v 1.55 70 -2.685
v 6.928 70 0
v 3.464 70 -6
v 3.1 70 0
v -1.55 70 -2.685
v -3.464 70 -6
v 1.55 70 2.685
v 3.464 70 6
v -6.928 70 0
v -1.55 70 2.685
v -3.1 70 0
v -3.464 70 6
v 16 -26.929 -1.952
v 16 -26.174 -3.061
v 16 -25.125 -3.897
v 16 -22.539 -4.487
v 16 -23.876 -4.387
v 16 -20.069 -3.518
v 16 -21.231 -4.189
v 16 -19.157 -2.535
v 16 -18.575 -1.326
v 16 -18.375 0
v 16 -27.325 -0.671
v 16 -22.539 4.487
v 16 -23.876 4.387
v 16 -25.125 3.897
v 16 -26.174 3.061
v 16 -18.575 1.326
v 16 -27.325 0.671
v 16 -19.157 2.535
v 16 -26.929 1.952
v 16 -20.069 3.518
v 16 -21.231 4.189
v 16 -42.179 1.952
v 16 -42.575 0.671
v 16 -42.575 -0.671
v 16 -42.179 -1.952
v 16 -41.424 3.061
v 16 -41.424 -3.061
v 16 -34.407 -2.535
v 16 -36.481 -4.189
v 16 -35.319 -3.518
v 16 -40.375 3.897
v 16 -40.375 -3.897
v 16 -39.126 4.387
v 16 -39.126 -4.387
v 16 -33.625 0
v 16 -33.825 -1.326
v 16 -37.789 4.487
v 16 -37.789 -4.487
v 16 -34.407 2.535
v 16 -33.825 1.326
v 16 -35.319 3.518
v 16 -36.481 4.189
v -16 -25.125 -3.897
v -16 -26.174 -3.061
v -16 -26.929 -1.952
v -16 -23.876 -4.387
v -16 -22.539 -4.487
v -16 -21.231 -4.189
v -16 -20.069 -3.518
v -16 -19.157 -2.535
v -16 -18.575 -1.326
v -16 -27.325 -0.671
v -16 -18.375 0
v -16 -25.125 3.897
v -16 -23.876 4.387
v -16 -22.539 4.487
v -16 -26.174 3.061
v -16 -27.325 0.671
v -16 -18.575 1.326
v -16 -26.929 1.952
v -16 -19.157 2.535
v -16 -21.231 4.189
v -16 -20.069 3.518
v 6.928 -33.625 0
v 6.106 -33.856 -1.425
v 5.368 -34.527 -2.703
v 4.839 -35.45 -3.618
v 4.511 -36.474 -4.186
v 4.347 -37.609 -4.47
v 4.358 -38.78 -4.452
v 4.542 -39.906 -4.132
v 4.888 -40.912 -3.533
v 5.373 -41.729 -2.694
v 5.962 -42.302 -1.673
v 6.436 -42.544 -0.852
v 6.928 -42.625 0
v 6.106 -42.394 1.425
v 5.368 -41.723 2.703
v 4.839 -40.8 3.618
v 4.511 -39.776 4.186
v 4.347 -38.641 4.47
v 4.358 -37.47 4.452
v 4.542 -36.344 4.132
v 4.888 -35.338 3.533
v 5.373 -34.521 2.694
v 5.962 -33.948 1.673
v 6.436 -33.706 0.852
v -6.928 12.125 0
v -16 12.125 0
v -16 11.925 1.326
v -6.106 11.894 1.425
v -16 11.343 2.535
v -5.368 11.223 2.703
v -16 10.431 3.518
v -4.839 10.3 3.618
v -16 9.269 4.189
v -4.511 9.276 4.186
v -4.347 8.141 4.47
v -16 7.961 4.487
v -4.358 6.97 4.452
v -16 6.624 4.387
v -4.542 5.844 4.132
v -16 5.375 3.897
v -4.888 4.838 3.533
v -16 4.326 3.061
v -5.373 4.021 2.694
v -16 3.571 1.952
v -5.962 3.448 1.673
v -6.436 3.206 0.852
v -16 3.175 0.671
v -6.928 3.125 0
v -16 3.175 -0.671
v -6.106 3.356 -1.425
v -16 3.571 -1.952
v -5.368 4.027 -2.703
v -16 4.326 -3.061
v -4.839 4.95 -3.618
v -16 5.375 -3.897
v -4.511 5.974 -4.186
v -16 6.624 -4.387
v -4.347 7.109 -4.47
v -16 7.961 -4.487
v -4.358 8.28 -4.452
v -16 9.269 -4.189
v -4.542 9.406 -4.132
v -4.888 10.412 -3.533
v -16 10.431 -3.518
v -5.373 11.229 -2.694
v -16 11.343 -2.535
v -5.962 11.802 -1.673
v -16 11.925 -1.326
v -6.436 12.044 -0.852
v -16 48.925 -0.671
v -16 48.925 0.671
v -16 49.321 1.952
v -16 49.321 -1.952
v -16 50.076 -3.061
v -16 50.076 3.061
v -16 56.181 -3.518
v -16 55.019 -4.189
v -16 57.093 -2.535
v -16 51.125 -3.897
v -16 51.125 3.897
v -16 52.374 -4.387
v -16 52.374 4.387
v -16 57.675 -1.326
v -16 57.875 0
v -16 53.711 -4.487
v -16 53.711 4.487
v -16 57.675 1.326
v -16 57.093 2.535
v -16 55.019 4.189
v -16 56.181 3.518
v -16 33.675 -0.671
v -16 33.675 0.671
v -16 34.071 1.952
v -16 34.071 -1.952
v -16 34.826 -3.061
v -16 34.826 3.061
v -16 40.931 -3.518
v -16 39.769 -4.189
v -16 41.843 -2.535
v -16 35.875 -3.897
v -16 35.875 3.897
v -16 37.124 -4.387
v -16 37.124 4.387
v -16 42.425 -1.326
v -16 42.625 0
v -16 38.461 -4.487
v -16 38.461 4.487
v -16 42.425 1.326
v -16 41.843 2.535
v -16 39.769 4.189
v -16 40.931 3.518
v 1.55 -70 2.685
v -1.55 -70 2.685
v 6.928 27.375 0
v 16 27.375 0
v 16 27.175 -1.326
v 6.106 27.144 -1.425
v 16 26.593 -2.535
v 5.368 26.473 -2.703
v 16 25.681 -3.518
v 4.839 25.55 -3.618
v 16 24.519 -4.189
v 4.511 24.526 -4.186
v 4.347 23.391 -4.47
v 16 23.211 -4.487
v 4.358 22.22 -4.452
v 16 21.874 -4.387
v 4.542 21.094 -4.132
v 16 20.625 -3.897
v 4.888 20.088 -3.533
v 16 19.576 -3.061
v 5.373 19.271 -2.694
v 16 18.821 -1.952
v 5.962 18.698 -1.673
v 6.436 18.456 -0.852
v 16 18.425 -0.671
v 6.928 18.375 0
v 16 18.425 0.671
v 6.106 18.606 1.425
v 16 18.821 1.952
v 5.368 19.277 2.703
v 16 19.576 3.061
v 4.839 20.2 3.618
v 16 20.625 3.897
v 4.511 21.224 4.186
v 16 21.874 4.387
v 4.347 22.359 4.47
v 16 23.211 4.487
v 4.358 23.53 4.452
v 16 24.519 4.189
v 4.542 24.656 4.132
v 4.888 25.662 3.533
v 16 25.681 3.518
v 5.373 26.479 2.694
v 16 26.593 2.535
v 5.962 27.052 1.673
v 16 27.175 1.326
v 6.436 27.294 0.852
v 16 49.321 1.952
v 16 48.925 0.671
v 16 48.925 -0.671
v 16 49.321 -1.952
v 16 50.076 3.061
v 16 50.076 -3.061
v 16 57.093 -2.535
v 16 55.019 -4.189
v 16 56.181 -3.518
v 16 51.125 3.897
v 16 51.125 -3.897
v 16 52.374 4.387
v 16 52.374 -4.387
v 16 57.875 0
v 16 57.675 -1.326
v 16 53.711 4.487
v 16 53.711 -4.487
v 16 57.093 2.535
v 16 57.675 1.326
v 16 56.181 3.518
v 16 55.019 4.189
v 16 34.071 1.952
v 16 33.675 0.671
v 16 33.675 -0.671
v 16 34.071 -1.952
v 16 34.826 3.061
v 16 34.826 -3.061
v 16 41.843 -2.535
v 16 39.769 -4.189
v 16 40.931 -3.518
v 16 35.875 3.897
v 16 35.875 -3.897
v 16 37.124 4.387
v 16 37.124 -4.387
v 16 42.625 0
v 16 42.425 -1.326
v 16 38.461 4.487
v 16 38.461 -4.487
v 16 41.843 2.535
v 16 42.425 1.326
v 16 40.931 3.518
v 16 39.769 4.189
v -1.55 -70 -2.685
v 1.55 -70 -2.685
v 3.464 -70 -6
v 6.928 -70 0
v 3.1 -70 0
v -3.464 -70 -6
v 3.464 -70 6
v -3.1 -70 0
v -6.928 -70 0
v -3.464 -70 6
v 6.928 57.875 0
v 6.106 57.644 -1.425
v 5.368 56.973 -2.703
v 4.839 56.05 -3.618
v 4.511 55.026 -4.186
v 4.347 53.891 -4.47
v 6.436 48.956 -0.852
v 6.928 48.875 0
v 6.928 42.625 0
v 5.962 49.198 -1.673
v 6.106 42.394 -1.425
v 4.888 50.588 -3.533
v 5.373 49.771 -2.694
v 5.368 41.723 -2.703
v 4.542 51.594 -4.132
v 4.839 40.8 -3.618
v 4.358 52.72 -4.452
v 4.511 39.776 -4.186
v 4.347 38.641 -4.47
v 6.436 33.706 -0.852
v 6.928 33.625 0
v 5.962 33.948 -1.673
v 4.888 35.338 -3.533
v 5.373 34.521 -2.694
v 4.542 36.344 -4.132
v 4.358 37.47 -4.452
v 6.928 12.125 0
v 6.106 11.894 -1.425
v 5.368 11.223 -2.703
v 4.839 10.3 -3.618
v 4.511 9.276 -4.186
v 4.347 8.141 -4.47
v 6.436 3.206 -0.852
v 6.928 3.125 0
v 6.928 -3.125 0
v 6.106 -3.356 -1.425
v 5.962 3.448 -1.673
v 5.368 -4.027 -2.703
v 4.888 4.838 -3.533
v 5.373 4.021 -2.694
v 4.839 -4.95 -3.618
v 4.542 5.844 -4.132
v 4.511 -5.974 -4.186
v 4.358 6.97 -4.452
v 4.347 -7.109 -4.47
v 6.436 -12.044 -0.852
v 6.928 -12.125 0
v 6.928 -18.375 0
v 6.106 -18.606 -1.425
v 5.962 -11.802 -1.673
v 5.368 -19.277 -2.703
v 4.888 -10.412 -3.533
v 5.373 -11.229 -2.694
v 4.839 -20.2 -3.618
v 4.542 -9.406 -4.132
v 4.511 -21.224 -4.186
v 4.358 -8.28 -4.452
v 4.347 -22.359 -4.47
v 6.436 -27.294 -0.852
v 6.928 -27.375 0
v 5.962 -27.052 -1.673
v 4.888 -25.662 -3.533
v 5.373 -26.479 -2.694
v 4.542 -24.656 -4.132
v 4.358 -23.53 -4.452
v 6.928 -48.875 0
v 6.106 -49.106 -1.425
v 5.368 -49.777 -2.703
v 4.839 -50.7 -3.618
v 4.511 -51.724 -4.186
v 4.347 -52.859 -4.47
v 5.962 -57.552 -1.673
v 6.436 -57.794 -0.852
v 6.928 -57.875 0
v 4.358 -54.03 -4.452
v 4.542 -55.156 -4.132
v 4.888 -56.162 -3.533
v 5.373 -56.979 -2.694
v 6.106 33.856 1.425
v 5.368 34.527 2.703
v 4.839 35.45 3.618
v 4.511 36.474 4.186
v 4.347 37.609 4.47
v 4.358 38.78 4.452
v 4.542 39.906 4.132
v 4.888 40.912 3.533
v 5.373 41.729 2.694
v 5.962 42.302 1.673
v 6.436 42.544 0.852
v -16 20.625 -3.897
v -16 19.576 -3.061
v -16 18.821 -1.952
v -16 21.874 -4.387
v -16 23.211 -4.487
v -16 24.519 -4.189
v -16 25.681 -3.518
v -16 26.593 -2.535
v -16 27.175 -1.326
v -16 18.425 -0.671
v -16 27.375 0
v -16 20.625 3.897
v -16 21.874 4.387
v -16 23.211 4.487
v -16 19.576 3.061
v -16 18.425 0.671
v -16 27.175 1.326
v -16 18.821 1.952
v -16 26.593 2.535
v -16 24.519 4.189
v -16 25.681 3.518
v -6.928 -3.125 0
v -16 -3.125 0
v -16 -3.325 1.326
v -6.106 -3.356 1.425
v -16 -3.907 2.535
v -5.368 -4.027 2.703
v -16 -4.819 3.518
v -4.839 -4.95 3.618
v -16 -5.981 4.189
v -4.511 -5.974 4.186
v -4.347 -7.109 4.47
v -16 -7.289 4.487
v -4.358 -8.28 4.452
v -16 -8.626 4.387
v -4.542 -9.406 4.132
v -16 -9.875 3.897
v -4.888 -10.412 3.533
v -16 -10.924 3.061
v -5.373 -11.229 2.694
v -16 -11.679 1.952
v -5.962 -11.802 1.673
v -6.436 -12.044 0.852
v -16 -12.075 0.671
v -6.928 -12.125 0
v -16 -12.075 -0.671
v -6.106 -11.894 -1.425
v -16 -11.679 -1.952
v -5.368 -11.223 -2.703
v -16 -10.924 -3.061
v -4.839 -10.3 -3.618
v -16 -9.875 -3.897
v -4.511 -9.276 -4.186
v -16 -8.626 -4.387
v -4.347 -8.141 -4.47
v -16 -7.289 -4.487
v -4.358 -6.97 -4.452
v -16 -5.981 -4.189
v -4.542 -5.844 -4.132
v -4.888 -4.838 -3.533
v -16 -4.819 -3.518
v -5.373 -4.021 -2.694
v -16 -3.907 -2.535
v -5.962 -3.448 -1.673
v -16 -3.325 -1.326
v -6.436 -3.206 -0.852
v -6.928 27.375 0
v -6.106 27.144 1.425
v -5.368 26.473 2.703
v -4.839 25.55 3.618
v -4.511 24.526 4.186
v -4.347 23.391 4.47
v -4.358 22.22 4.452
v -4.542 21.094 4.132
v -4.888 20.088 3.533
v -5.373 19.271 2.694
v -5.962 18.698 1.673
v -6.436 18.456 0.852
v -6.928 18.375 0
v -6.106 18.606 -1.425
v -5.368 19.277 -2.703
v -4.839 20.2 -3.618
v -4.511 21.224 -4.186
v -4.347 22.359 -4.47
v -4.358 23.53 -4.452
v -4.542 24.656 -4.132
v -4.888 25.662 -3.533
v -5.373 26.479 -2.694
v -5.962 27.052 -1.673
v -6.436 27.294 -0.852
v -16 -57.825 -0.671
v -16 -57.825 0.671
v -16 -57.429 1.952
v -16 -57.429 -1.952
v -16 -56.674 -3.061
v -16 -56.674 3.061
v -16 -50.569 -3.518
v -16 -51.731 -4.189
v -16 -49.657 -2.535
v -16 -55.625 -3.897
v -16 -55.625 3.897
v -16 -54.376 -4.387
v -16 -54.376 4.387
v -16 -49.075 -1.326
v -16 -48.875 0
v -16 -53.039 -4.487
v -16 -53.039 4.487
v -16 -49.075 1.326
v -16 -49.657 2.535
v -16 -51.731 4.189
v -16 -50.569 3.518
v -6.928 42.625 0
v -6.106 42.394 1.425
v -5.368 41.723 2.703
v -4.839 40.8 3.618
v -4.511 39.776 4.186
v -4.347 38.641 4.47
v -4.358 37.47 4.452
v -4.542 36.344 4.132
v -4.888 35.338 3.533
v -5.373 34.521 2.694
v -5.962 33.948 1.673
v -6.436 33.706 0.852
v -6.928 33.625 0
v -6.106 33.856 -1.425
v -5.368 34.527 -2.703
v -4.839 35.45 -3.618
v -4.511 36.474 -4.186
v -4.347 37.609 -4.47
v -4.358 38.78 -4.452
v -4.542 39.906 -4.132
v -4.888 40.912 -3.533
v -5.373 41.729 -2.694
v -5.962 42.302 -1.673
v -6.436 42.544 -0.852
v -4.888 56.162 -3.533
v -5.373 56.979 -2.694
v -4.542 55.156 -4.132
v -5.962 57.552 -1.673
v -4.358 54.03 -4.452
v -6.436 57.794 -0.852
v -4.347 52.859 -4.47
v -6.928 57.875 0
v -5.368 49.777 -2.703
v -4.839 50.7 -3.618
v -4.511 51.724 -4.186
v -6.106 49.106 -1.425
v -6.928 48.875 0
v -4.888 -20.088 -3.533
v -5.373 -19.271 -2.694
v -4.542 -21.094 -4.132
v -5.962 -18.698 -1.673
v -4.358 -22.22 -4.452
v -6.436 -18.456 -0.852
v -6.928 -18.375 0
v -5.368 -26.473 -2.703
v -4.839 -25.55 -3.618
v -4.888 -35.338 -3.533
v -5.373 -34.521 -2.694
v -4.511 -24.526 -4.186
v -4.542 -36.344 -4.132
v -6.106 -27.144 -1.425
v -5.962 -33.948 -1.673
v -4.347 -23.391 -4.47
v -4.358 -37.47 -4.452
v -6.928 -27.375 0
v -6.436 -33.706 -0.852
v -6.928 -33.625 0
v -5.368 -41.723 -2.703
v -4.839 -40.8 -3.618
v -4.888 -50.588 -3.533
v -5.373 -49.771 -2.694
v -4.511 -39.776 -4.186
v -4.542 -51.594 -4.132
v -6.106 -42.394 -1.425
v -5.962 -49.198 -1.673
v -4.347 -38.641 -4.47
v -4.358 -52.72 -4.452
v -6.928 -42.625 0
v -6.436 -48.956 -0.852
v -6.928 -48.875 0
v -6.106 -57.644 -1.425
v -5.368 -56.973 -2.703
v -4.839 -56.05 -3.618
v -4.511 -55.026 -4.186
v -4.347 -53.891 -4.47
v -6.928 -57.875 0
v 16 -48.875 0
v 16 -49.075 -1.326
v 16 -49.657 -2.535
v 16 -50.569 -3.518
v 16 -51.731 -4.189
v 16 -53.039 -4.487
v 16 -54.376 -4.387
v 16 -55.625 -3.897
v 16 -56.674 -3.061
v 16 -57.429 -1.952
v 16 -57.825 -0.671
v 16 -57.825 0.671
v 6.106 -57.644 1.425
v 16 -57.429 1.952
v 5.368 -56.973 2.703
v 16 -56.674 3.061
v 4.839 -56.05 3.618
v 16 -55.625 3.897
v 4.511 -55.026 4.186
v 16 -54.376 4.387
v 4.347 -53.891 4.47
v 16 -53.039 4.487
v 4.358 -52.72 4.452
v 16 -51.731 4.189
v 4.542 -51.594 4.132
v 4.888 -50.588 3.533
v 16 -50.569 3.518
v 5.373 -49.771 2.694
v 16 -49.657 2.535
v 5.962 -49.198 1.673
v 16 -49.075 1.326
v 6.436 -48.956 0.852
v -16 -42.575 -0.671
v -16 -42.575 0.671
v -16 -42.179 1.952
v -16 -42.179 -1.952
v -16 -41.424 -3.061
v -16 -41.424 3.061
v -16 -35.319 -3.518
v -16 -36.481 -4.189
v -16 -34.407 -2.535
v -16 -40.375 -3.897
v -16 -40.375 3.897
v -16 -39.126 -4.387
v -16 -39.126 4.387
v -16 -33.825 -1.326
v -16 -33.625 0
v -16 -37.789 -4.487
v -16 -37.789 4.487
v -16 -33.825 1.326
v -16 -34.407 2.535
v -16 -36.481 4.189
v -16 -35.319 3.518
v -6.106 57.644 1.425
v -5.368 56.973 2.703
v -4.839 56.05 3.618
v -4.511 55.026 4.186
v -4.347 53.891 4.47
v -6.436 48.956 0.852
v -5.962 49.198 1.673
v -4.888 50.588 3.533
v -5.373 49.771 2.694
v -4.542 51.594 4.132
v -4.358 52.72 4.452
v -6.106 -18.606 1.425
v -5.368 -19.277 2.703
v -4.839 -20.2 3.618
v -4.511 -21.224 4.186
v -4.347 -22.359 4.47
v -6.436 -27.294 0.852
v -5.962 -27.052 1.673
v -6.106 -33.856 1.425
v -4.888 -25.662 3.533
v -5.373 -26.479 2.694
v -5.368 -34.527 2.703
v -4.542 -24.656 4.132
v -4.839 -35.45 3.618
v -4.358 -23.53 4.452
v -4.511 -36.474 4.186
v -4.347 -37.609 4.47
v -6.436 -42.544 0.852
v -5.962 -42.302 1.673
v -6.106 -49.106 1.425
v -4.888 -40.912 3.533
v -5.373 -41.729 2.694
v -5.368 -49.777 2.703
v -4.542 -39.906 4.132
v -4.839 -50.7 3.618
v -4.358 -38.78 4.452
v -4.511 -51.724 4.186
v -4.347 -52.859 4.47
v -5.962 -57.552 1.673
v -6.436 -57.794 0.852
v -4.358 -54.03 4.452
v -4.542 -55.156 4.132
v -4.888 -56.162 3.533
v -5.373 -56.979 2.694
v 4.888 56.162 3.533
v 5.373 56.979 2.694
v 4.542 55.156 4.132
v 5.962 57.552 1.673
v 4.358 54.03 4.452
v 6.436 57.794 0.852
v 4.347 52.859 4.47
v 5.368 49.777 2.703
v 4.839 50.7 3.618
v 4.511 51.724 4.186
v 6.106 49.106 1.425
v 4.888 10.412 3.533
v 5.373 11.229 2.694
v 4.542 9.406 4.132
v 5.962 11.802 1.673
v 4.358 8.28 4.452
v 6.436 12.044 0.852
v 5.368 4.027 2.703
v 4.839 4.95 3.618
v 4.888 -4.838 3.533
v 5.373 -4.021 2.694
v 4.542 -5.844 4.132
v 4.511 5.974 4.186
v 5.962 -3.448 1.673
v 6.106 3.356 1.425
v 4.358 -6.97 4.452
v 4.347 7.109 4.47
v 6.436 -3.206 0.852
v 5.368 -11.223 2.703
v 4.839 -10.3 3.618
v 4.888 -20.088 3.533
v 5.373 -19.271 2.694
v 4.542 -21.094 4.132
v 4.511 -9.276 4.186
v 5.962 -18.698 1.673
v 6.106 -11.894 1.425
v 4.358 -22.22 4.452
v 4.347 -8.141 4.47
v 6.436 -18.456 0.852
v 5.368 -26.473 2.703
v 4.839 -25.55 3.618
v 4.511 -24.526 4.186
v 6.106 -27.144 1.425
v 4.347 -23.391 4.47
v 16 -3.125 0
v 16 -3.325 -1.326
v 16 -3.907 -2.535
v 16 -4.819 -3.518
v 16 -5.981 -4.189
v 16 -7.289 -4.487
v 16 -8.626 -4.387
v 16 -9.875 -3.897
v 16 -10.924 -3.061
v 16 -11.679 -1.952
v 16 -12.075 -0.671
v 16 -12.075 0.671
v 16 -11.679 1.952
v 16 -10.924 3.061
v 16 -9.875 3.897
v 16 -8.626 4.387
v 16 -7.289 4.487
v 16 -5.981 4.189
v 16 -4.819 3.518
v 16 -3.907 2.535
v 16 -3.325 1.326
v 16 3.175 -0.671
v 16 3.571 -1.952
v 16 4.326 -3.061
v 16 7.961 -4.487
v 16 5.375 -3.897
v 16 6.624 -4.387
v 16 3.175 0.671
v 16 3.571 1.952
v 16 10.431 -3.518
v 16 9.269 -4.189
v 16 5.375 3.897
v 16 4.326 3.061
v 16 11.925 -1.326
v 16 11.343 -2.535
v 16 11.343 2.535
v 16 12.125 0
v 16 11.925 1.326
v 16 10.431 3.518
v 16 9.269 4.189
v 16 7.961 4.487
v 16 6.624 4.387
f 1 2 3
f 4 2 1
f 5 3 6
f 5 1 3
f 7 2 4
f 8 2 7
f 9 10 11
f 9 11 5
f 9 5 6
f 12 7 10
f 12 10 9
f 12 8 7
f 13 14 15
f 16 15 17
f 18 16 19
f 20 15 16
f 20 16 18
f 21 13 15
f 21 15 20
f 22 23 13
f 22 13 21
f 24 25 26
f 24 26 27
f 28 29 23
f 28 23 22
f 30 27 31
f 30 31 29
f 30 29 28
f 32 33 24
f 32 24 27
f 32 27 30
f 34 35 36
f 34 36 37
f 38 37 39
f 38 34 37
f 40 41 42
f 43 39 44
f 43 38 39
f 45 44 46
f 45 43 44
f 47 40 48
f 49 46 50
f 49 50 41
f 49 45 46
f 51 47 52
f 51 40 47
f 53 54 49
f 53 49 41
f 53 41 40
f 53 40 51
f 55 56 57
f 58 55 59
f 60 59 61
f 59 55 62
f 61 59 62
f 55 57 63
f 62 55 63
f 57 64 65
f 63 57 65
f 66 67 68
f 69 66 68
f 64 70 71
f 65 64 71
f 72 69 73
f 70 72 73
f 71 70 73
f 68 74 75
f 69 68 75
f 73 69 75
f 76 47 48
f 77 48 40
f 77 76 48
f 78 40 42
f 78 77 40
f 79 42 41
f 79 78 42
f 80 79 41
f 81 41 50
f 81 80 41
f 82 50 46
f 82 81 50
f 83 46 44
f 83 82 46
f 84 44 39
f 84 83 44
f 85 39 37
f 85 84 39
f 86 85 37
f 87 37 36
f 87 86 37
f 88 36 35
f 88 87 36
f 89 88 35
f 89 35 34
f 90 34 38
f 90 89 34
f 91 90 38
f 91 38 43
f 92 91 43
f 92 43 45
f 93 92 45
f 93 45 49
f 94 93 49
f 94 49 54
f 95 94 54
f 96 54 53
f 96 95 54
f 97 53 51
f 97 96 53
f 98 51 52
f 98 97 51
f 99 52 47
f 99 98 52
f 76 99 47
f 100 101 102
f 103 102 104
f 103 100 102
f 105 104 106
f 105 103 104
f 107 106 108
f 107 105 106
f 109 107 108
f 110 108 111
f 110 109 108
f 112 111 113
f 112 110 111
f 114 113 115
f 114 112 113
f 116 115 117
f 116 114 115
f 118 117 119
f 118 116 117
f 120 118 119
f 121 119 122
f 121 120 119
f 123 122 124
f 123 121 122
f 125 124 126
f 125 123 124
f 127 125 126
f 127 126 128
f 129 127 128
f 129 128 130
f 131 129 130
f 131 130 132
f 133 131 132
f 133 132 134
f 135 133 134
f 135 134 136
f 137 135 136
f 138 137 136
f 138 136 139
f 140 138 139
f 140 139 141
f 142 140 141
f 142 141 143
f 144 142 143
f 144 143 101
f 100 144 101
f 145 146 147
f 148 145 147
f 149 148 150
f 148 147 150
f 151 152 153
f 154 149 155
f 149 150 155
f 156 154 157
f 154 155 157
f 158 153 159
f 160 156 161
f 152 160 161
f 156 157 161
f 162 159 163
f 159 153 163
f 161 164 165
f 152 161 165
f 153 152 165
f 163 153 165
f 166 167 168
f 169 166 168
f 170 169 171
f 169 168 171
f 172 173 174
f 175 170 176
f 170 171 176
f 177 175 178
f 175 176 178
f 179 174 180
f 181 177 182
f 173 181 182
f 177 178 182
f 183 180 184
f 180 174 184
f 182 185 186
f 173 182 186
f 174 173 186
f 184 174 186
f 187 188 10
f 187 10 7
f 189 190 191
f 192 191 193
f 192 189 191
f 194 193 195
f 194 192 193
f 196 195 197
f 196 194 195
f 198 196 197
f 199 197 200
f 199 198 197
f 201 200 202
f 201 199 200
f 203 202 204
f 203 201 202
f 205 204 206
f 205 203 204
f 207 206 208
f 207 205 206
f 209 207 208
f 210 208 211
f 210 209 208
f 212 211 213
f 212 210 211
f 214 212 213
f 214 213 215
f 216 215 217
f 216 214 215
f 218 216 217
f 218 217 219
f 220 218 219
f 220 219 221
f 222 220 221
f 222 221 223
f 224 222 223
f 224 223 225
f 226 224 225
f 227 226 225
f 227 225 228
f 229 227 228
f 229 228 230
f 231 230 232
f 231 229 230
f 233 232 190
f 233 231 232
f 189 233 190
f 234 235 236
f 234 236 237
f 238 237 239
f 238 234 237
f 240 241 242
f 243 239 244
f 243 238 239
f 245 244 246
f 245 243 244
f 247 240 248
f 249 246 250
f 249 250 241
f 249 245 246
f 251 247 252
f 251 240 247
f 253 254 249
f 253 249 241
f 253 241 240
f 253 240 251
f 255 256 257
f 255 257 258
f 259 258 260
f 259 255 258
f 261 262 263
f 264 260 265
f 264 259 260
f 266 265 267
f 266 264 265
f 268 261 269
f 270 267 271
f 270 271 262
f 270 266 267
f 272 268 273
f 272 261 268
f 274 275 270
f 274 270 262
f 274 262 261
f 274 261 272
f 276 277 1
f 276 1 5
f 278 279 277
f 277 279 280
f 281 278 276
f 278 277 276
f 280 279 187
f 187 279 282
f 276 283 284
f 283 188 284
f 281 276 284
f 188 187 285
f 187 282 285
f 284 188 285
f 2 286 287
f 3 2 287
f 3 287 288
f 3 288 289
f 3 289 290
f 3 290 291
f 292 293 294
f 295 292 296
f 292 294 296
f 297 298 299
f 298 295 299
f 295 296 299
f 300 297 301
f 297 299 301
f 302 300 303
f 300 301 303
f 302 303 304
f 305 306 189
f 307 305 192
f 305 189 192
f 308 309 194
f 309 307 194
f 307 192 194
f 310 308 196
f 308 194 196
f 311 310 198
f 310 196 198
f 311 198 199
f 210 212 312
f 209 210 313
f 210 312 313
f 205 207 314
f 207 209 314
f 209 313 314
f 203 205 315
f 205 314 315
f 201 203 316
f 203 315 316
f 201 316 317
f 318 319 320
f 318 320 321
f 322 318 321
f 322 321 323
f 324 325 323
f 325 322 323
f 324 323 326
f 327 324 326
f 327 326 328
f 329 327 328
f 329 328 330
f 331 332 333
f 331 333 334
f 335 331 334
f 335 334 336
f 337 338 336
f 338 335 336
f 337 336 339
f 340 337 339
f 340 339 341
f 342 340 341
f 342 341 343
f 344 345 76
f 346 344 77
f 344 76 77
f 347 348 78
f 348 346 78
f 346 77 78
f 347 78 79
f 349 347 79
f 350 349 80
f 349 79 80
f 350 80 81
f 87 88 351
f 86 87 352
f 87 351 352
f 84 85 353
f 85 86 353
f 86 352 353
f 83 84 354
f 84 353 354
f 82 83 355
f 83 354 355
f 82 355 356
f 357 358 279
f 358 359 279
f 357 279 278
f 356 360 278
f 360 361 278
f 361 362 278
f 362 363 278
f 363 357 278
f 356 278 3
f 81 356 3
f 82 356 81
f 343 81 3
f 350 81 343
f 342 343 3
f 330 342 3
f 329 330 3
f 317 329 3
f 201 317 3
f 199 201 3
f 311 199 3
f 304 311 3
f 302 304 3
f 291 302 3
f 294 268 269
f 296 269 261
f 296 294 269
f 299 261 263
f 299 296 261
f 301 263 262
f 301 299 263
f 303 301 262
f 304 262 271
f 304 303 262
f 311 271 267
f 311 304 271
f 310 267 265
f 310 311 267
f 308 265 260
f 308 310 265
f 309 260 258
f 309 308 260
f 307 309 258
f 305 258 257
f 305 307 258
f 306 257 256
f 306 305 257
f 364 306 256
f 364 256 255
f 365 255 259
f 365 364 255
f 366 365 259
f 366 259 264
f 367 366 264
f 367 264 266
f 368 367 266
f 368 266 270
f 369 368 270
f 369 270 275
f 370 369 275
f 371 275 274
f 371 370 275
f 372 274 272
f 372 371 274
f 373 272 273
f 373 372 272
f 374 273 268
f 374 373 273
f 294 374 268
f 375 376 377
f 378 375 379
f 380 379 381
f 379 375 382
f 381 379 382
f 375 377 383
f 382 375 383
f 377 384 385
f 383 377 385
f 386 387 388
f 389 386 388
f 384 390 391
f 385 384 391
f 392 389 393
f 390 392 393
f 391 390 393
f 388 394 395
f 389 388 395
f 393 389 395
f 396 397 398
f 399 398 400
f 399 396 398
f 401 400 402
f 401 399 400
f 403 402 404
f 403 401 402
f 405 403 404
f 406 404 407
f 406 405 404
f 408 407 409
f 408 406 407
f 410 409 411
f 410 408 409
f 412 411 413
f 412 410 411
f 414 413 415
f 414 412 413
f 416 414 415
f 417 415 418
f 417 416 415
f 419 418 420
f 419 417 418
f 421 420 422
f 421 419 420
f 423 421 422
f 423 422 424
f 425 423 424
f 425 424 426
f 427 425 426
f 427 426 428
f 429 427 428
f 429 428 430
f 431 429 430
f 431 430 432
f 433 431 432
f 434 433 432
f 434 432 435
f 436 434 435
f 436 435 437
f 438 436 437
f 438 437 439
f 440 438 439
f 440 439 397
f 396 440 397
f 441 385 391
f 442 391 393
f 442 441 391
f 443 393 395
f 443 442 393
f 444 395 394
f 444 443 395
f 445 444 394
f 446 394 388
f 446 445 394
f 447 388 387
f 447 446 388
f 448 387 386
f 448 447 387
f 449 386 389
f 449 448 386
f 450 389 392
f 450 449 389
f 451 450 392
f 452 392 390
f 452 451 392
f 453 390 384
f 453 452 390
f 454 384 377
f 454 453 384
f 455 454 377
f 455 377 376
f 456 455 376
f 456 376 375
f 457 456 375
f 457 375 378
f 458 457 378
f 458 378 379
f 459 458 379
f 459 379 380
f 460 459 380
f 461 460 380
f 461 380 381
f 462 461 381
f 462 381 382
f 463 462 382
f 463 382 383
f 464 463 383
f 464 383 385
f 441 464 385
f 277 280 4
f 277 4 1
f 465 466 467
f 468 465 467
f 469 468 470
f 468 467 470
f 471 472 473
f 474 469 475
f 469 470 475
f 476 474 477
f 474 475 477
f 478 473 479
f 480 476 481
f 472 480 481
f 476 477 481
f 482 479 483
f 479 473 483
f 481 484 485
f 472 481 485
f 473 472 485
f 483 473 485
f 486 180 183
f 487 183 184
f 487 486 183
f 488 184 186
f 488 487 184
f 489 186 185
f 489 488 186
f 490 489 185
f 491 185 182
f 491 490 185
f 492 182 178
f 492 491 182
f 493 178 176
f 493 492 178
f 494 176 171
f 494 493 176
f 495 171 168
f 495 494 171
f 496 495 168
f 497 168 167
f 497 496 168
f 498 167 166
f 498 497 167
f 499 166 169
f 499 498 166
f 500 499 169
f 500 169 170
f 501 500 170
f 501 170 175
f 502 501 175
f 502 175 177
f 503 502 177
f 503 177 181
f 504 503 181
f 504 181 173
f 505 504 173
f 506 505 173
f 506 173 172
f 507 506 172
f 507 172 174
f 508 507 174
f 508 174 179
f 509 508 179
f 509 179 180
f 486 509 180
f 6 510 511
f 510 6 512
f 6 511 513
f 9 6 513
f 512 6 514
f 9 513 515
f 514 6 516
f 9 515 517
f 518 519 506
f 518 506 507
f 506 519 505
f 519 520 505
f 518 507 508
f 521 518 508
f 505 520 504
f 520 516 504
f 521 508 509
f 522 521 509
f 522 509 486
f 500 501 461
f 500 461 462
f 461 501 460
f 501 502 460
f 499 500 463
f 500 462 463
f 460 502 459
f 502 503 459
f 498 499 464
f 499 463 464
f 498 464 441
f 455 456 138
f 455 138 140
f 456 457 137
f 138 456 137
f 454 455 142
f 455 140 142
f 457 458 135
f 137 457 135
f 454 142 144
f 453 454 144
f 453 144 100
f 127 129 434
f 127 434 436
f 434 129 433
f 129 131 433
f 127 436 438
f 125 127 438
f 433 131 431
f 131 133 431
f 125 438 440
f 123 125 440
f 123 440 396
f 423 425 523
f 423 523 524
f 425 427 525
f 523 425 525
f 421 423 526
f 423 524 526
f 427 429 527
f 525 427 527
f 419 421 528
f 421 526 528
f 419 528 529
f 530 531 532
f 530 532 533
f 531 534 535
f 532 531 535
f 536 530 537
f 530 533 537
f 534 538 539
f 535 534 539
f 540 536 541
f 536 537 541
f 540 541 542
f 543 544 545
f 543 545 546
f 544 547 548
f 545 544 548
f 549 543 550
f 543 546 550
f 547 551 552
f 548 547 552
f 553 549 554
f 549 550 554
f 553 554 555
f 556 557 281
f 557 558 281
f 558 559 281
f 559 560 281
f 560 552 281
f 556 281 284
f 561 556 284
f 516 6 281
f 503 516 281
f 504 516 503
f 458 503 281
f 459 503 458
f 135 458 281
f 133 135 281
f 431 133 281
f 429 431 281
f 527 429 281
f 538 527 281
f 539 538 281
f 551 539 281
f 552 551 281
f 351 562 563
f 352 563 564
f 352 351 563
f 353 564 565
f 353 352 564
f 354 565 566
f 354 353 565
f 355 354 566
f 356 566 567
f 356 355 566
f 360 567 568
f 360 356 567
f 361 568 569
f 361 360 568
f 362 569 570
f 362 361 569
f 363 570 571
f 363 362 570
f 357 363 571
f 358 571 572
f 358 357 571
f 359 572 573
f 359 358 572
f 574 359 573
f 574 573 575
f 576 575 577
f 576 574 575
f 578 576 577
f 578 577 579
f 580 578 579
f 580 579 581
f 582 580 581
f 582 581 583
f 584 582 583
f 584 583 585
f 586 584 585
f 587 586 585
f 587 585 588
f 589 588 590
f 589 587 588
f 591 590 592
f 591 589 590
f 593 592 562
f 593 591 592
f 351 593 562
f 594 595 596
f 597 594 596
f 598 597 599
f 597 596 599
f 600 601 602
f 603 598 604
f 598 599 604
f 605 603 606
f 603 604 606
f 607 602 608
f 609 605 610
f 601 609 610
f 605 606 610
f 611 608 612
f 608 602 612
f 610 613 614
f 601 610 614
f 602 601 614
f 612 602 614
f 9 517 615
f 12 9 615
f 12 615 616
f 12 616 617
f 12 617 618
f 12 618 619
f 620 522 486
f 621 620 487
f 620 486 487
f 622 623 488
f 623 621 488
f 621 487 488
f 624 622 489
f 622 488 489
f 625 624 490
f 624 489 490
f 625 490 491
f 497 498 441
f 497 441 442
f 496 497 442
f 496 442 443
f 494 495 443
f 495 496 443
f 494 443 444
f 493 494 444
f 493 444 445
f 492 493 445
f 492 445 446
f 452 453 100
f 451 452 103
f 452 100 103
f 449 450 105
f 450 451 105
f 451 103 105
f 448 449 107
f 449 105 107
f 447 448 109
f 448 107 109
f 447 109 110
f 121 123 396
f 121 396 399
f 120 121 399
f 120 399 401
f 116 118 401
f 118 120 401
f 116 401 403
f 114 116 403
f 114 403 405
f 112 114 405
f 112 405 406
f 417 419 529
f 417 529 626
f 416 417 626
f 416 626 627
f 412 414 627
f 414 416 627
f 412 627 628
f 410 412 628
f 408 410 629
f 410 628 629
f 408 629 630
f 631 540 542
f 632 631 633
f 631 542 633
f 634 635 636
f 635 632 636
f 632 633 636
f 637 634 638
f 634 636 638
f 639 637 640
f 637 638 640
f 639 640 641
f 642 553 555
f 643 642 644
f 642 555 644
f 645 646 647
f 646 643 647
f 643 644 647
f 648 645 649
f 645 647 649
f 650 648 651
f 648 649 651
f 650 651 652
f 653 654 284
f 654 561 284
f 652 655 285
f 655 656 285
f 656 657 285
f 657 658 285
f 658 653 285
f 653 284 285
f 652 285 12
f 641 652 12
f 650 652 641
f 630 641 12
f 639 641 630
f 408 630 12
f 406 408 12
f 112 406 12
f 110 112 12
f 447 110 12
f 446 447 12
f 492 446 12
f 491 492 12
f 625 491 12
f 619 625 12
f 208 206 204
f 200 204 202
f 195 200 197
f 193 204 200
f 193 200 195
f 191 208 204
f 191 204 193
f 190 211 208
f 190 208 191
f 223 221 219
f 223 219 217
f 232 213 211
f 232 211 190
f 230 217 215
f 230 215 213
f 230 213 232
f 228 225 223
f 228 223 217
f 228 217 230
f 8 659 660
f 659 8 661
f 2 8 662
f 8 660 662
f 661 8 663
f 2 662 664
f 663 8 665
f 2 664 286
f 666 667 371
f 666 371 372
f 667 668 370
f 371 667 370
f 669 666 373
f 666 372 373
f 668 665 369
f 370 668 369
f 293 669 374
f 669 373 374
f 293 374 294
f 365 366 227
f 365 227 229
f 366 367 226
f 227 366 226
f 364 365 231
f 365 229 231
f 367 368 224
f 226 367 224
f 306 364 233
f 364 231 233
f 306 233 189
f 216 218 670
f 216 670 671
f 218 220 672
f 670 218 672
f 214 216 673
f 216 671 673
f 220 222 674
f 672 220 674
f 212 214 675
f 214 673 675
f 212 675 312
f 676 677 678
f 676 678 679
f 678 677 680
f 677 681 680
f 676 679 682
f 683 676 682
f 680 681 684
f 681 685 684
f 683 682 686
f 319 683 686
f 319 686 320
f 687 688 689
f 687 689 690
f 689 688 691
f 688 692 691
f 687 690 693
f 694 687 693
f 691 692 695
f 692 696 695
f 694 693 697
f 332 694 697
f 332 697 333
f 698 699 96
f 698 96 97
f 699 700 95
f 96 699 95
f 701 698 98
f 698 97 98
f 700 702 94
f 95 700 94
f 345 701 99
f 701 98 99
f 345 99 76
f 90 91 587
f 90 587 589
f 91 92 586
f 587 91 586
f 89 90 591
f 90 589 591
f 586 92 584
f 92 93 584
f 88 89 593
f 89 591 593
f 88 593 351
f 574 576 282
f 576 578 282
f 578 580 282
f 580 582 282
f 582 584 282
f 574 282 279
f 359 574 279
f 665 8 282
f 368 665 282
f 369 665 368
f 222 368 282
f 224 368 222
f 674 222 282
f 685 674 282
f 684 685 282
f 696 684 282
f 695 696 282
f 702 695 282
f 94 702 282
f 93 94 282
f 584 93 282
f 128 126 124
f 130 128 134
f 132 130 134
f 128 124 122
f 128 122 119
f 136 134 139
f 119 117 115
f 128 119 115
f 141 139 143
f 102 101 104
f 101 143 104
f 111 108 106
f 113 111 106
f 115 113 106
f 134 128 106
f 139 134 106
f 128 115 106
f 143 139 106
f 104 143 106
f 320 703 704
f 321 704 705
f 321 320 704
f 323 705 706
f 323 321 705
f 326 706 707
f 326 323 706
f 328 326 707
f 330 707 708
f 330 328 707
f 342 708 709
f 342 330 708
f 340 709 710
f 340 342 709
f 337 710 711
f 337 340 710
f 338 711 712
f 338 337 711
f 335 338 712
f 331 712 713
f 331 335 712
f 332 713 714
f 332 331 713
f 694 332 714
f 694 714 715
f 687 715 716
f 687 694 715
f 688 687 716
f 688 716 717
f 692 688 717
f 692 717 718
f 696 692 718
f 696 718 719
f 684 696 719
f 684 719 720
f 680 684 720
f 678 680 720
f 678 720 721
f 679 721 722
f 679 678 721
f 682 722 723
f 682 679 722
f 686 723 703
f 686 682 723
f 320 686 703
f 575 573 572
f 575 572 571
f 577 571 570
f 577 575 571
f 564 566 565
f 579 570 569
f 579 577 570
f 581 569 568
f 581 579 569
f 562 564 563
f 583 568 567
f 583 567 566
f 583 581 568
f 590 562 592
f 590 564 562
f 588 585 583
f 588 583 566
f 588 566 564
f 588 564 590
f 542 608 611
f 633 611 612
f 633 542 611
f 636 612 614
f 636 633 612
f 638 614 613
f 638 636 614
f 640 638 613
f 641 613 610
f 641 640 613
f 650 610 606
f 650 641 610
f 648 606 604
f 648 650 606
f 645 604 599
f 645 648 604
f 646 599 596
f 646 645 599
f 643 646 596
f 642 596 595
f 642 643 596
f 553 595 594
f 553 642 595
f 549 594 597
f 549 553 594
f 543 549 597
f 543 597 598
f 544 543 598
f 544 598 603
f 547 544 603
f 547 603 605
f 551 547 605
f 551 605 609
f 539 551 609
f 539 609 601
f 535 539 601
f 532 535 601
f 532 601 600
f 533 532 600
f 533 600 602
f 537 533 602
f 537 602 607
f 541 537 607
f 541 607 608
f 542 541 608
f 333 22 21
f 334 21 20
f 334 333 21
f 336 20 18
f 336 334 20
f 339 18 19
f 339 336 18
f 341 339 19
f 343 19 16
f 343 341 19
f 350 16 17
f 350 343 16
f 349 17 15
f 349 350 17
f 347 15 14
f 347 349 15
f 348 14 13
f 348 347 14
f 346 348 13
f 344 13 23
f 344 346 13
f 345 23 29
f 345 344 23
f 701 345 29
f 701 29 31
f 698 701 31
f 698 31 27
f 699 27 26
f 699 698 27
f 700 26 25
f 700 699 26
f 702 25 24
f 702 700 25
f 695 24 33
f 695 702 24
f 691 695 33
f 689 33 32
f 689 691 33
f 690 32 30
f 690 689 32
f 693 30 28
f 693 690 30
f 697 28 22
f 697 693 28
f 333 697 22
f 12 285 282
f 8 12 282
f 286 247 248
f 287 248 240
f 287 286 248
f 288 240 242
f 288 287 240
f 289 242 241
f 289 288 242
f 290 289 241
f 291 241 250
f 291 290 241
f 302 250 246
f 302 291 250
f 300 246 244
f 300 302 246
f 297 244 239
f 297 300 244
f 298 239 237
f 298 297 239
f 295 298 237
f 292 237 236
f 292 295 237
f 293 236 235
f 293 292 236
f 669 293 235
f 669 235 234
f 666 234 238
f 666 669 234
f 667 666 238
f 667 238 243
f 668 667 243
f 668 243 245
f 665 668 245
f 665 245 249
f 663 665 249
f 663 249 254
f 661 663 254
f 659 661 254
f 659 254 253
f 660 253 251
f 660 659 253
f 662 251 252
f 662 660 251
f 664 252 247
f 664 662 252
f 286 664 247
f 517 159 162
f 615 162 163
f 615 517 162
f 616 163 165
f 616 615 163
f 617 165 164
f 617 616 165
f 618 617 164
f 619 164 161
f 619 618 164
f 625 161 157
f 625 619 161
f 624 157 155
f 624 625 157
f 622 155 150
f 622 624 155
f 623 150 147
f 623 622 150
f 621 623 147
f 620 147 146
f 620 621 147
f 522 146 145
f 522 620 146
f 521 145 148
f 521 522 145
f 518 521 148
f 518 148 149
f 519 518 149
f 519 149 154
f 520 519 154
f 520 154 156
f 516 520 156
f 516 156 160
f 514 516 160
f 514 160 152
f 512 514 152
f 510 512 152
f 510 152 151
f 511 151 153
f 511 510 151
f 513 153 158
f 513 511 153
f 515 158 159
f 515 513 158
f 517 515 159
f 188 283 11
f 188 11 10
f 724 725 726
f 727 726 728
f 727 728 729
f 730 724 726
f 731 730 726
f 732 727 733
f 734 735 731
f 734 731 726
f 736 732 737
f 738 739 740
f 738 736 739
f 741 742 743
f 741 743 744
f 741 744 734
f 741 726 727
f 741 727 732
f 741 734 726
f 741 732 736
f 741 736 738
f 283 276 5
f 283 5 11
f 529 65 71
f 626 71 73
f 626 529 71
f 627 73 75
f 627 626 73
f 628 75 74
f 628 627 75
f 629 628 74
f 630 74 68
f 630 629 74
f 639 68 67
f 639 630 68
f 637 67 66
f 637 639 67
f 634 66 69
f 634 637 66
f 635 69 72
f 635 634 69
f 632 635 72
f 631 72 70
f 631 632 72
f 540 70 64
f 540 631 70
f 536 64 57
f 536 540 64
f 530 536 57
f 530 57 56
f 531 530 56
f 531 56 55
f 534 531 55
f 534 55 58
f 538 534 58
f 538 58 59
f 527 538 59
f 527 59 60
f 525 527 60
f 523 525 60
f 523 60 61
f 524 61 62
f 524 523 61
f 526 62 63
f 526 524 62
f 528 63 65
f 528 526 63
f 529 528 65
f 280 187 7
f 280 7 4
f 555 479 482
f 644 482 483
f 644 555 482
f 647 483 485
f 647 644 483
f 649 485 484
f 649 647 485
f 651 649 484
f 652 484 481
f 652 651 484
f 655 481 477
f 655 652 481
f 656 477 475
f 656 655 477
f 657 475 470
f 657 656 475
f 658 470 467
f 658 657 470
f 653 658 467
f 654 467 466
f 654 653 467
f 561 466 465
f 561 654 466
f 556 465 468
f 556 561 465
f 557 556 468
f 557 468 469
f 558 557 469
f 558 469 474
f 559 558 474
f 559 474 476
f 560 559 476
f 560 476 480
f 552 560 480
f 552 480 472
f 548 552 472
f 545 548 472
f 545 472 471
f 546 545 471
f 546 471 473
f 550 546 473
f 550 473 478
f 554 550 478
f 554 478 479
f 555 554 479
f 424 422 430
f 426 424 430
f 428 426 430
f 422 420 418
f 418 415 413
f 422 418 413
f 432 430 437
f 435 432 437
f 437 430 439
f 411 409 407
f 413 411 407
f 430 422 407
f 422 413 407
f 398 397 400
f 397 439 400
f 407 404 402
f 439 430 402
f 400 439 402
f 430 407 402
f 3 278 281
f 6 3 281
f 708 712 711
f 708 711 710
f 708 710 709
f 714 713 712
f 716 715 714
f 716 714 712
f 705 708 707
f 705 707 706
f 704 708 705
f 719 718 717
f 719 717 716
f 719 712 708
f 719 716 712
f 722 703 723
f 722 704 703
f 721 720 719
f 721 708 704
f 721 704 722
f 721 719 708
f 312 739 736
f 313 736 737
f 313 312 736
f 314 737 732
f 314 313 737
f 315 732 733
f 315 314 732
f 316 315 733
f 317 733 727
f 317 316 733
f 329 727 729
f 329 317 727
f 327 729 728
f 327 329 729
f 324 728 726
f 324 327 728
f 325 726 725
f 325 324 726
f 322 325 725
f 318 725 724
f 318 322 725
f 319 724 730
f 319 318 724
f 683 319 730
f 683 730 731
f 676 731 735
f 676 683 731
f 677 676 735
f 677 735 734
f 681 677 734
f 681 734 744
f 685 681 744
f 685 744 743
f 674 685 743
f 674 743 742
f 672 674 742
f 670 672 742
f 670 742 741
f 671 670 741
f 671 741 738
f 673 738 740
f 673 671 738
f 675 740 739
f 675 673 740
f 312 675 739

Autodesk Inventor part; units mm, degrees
ref_plane "YZ Plane" through (0, 0, 0) normal (1, 0, 0) x (0, 1, 0)
ref_plane "XZ Plane" through (0, 0, 0) normal (0, 1, 0) x (-1, 0, 0)
ref_plane "XY Plane" through (0, 0, 0) normal (0, 0, 1) x (1, 0, 0)
sketch "Outer Diameter Sketch" plane through (0, 0, 0) normal (0, 1, 0) x (-1, 0, 0)
  line L0 (0, -28.0163) -> (0, 28.3344) construction
  line L1 (17.1062, 0) -> (-23.8822, 0) construction
  line L2 (3.4641, -6) -> (6.9282, 0)
  line L3 (6.9282, 0) -> (3.4641, 6)
  line L4 (3.4641, 6) -> (-3.4641, 6)
  line L5 (-3.4641, 6) -> (-6.9282, 0)
  line L6 (-6.9282, 0) -> (-3.4641, -6)
  line L7 (-3.4641, -6) -> (3.4641, -6)
  line L8 (0, -6) -> (0, 6) construction
  line L9 (-6.9282, 0) -> (6.9282, 0) construction
  point P0 (0, 0)
  dimension "d23" = 120
  dimension "d25" = 120
  dimension "d27" = 120
  dimension "d29" = 120
  dimension "d31" = 120
  dimension "d32" = 12
extrude "Outer Diameter Extrusion" add sketch "Outer Diameter Sketch" along normal mid plane 140
sketch "Sketch2" plane through (0, 0, 0) normal (1, 0, 0) x (0, 1, 0)
  circle A0 centre (-7.625, 0) radius 4.5
  line L0 (-77.625, 0) -> (-7.625, 0) construction
  line L1 (-7.625, 0) -> (62.375, 0) construction
  circle A1 centre (7.625, 0) radius 4.5
  circle A2 centre (22.875, 0) radius 4.5
  circle A3 centre (38.125, 0) radius 4.5
  circle A4 centre (-22.875, 0) radius 4.5
  circle A5 centre (-7.625, 0) radius 4.5
  circle A6 centre (7.625, 0) radius 4.5
  circle A7 centre (22.875, 0) radius 4.5
  circle A8 centre (-38.125, 0) radius 4.5
  circle A9 centre (-22.875, 0) radius 4.5
  circle A10 centre (-7.625, 0) radius 4.5
  circle A11 centre (7.625, 0) radius 4.5
  circle A12 centre (-53.375, 0) radius 4.5
  circle A13 centre (-38.125, 0) radius 4.5
  circle A14 centre (-22.875, 0) radius 4.5
  circle A15 centre (-7.625, 0) radius 4.5
  line L2 (0, 54.0285) -> (0, -72.3739) construction
  circle A16 centre (53.375, 0) radius 4.5
  circle A17 centre (38.125, 0) radius 4.5
  circle A18 centre (22.875, 0) radius 4.5
  circle A19 centre (7.625, 0) radius 4.5
  dimension "d3" = 9
  dimension "d5" = 140
  dimension "d8" = 15.25
  dimension "d11" = 15.25
  dimension "d47" = 7.625
  dimension "d48" = 7.625
extrude "Extrusion2" add sketch "Sketch2" along normal mid plane 32
sketch "Sketch3" plane through (0, -70, 0) normal (0, -1, 0) x (1, 0, 0)
  line L0 (1.55, -2.6847) -> (-1.55, -2.6847)
  line L1 (-1.55, -2.6847) -> (-3.1, 0)
  line L2 (-3.1, 0) -> (-1.55, 2.6847)
  line L3 (-1.55, 2.6847) -> (1.55, 2.6847)
  line L4 (1.55, 2.6847) -> (3.1, 0)
  line L5 (3.1, 0) -> (1.55, -2.6847)
  line L6 (3.1, 0) -> (-3.1, 0) construction
  line L7 (0, 2.6847) -> (0, -2.6847) construction
  line L8 (10.3659, 0) -> (-11.745, 0) construction
  line L9 (0, -9.4896) -> (0, 9.303) construction
  point P0 (0, 0)
  dimension "d33" = 3.1
  dimension "d34" = 3.1
  dimension "d35" = 120
  dimension "d36" = 3.1
  dimension "d37" = 120
  dimension "d38" = 3.1
  dimension "d39" = 120
  dimension "d40" = 3.1
  dimension "d41" = 120
extrude "Extrusion3" cut sketch "Sketch3" against normal up to surface (140 mm away)
equation "\"d1\" = outL"
equation "\"d3\" = pegD"
equation "\"d5\" = outL"
equation "\"d47\" = 0.5 * d8"
equation "\"d14\" = pegL + 2 * outD"
equation "\"d33\" = inhexSL"
equation "\"d34\" = inhexSL"
equation "\"d36\" = inhexSL"
equation "\"d38\" = inhexSL"
equation "\"d40\" = inhexSL"
equation "\"d42\" = pegL + 2 * outD"
equation "\"outD\" = 12"
equation "\"inhexSL\" = 3.1"
equation "\"outL\" = 140"
equation "\"pegL\" = 8"
equation "\"pegD\" = 9"
equation "\"outhexSL\" = 5"
properties part number "Peg Spinner V2"
